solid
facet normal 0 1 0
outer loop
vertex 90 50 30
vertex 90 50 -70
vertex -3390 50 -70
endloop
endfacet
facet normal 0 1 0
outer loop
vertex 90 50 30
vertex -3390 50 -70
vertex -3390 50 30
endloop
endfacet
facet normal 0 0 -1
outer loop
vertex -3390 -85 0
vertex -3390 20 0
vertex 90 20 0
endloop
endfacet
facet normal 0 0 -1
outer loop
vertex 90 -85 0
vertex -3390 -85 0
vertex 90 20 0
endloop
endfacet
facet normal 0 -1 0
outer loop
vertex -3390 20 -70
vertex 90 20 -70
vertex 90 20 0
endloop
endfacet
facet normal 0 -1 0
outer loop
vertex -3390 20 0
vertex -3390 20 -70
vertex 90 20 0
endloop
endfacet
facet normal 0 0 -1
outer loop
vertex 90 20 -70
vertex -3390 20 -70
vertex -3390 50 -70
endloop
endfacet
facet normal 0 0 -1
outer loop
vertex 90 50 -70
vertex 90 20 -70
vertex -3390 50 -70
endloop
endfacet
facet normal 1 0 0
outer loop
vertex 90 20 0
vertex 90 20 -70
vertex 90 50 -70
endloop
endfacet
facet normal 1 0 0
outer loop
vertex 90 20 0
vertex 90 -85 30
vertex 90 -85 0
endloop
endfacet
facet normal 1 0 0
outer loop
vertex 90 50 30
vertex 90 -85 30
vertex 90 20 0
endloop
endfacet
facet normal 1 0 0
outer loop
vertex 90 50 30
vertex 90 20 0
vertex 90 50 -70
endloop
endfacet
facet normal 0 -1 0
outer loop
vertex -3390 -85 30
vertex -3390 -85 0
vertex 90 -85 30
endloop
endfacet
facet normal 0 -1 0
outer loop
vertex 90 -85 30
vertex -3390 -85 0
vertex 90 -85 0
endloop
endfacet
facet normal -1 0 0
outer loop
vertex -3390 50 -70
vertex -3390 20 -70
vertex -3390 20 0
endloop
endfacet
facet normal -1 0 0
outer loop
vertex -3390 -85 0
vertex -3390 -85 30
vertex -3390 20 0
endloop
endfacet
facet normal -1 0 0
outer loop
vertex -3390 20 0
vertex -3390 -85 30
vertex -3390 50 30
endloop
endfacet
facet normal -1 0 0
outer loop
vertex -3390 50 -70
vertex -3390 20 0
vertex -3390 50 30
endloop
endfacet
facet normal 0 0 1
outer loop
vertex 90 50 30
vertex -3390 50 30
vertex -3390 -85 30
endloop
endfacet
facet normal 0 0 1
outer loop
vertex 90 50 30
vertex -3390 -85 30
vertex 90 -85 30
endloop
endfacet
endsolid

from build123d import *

# Parameters (mm, degrees)
F0_W     = 3480
F0_H     = 135
F1_DEPTH = 30
F2_W     = 30
F2_H     = 70
F3_DEPTH = 3480


with BuildPart() as f1:
    # F0 (on Top) → F1 (new body)
    with BuildSketch(Plane.XY):
        with Locations((-1650, -17.5)):
            Rectangle(F0_W, F0_H)
    extrude(amount=F1_DEPTH)

    # F2 (on face) → F3 (join)
    with BuildSketch(Plane.YZ.offset(90)):
        with Locations((35, -35)):
            Rectangle(F2_W, F2_H)
    extrude(amount=-F3_DEPTH)


solid = f1.part
